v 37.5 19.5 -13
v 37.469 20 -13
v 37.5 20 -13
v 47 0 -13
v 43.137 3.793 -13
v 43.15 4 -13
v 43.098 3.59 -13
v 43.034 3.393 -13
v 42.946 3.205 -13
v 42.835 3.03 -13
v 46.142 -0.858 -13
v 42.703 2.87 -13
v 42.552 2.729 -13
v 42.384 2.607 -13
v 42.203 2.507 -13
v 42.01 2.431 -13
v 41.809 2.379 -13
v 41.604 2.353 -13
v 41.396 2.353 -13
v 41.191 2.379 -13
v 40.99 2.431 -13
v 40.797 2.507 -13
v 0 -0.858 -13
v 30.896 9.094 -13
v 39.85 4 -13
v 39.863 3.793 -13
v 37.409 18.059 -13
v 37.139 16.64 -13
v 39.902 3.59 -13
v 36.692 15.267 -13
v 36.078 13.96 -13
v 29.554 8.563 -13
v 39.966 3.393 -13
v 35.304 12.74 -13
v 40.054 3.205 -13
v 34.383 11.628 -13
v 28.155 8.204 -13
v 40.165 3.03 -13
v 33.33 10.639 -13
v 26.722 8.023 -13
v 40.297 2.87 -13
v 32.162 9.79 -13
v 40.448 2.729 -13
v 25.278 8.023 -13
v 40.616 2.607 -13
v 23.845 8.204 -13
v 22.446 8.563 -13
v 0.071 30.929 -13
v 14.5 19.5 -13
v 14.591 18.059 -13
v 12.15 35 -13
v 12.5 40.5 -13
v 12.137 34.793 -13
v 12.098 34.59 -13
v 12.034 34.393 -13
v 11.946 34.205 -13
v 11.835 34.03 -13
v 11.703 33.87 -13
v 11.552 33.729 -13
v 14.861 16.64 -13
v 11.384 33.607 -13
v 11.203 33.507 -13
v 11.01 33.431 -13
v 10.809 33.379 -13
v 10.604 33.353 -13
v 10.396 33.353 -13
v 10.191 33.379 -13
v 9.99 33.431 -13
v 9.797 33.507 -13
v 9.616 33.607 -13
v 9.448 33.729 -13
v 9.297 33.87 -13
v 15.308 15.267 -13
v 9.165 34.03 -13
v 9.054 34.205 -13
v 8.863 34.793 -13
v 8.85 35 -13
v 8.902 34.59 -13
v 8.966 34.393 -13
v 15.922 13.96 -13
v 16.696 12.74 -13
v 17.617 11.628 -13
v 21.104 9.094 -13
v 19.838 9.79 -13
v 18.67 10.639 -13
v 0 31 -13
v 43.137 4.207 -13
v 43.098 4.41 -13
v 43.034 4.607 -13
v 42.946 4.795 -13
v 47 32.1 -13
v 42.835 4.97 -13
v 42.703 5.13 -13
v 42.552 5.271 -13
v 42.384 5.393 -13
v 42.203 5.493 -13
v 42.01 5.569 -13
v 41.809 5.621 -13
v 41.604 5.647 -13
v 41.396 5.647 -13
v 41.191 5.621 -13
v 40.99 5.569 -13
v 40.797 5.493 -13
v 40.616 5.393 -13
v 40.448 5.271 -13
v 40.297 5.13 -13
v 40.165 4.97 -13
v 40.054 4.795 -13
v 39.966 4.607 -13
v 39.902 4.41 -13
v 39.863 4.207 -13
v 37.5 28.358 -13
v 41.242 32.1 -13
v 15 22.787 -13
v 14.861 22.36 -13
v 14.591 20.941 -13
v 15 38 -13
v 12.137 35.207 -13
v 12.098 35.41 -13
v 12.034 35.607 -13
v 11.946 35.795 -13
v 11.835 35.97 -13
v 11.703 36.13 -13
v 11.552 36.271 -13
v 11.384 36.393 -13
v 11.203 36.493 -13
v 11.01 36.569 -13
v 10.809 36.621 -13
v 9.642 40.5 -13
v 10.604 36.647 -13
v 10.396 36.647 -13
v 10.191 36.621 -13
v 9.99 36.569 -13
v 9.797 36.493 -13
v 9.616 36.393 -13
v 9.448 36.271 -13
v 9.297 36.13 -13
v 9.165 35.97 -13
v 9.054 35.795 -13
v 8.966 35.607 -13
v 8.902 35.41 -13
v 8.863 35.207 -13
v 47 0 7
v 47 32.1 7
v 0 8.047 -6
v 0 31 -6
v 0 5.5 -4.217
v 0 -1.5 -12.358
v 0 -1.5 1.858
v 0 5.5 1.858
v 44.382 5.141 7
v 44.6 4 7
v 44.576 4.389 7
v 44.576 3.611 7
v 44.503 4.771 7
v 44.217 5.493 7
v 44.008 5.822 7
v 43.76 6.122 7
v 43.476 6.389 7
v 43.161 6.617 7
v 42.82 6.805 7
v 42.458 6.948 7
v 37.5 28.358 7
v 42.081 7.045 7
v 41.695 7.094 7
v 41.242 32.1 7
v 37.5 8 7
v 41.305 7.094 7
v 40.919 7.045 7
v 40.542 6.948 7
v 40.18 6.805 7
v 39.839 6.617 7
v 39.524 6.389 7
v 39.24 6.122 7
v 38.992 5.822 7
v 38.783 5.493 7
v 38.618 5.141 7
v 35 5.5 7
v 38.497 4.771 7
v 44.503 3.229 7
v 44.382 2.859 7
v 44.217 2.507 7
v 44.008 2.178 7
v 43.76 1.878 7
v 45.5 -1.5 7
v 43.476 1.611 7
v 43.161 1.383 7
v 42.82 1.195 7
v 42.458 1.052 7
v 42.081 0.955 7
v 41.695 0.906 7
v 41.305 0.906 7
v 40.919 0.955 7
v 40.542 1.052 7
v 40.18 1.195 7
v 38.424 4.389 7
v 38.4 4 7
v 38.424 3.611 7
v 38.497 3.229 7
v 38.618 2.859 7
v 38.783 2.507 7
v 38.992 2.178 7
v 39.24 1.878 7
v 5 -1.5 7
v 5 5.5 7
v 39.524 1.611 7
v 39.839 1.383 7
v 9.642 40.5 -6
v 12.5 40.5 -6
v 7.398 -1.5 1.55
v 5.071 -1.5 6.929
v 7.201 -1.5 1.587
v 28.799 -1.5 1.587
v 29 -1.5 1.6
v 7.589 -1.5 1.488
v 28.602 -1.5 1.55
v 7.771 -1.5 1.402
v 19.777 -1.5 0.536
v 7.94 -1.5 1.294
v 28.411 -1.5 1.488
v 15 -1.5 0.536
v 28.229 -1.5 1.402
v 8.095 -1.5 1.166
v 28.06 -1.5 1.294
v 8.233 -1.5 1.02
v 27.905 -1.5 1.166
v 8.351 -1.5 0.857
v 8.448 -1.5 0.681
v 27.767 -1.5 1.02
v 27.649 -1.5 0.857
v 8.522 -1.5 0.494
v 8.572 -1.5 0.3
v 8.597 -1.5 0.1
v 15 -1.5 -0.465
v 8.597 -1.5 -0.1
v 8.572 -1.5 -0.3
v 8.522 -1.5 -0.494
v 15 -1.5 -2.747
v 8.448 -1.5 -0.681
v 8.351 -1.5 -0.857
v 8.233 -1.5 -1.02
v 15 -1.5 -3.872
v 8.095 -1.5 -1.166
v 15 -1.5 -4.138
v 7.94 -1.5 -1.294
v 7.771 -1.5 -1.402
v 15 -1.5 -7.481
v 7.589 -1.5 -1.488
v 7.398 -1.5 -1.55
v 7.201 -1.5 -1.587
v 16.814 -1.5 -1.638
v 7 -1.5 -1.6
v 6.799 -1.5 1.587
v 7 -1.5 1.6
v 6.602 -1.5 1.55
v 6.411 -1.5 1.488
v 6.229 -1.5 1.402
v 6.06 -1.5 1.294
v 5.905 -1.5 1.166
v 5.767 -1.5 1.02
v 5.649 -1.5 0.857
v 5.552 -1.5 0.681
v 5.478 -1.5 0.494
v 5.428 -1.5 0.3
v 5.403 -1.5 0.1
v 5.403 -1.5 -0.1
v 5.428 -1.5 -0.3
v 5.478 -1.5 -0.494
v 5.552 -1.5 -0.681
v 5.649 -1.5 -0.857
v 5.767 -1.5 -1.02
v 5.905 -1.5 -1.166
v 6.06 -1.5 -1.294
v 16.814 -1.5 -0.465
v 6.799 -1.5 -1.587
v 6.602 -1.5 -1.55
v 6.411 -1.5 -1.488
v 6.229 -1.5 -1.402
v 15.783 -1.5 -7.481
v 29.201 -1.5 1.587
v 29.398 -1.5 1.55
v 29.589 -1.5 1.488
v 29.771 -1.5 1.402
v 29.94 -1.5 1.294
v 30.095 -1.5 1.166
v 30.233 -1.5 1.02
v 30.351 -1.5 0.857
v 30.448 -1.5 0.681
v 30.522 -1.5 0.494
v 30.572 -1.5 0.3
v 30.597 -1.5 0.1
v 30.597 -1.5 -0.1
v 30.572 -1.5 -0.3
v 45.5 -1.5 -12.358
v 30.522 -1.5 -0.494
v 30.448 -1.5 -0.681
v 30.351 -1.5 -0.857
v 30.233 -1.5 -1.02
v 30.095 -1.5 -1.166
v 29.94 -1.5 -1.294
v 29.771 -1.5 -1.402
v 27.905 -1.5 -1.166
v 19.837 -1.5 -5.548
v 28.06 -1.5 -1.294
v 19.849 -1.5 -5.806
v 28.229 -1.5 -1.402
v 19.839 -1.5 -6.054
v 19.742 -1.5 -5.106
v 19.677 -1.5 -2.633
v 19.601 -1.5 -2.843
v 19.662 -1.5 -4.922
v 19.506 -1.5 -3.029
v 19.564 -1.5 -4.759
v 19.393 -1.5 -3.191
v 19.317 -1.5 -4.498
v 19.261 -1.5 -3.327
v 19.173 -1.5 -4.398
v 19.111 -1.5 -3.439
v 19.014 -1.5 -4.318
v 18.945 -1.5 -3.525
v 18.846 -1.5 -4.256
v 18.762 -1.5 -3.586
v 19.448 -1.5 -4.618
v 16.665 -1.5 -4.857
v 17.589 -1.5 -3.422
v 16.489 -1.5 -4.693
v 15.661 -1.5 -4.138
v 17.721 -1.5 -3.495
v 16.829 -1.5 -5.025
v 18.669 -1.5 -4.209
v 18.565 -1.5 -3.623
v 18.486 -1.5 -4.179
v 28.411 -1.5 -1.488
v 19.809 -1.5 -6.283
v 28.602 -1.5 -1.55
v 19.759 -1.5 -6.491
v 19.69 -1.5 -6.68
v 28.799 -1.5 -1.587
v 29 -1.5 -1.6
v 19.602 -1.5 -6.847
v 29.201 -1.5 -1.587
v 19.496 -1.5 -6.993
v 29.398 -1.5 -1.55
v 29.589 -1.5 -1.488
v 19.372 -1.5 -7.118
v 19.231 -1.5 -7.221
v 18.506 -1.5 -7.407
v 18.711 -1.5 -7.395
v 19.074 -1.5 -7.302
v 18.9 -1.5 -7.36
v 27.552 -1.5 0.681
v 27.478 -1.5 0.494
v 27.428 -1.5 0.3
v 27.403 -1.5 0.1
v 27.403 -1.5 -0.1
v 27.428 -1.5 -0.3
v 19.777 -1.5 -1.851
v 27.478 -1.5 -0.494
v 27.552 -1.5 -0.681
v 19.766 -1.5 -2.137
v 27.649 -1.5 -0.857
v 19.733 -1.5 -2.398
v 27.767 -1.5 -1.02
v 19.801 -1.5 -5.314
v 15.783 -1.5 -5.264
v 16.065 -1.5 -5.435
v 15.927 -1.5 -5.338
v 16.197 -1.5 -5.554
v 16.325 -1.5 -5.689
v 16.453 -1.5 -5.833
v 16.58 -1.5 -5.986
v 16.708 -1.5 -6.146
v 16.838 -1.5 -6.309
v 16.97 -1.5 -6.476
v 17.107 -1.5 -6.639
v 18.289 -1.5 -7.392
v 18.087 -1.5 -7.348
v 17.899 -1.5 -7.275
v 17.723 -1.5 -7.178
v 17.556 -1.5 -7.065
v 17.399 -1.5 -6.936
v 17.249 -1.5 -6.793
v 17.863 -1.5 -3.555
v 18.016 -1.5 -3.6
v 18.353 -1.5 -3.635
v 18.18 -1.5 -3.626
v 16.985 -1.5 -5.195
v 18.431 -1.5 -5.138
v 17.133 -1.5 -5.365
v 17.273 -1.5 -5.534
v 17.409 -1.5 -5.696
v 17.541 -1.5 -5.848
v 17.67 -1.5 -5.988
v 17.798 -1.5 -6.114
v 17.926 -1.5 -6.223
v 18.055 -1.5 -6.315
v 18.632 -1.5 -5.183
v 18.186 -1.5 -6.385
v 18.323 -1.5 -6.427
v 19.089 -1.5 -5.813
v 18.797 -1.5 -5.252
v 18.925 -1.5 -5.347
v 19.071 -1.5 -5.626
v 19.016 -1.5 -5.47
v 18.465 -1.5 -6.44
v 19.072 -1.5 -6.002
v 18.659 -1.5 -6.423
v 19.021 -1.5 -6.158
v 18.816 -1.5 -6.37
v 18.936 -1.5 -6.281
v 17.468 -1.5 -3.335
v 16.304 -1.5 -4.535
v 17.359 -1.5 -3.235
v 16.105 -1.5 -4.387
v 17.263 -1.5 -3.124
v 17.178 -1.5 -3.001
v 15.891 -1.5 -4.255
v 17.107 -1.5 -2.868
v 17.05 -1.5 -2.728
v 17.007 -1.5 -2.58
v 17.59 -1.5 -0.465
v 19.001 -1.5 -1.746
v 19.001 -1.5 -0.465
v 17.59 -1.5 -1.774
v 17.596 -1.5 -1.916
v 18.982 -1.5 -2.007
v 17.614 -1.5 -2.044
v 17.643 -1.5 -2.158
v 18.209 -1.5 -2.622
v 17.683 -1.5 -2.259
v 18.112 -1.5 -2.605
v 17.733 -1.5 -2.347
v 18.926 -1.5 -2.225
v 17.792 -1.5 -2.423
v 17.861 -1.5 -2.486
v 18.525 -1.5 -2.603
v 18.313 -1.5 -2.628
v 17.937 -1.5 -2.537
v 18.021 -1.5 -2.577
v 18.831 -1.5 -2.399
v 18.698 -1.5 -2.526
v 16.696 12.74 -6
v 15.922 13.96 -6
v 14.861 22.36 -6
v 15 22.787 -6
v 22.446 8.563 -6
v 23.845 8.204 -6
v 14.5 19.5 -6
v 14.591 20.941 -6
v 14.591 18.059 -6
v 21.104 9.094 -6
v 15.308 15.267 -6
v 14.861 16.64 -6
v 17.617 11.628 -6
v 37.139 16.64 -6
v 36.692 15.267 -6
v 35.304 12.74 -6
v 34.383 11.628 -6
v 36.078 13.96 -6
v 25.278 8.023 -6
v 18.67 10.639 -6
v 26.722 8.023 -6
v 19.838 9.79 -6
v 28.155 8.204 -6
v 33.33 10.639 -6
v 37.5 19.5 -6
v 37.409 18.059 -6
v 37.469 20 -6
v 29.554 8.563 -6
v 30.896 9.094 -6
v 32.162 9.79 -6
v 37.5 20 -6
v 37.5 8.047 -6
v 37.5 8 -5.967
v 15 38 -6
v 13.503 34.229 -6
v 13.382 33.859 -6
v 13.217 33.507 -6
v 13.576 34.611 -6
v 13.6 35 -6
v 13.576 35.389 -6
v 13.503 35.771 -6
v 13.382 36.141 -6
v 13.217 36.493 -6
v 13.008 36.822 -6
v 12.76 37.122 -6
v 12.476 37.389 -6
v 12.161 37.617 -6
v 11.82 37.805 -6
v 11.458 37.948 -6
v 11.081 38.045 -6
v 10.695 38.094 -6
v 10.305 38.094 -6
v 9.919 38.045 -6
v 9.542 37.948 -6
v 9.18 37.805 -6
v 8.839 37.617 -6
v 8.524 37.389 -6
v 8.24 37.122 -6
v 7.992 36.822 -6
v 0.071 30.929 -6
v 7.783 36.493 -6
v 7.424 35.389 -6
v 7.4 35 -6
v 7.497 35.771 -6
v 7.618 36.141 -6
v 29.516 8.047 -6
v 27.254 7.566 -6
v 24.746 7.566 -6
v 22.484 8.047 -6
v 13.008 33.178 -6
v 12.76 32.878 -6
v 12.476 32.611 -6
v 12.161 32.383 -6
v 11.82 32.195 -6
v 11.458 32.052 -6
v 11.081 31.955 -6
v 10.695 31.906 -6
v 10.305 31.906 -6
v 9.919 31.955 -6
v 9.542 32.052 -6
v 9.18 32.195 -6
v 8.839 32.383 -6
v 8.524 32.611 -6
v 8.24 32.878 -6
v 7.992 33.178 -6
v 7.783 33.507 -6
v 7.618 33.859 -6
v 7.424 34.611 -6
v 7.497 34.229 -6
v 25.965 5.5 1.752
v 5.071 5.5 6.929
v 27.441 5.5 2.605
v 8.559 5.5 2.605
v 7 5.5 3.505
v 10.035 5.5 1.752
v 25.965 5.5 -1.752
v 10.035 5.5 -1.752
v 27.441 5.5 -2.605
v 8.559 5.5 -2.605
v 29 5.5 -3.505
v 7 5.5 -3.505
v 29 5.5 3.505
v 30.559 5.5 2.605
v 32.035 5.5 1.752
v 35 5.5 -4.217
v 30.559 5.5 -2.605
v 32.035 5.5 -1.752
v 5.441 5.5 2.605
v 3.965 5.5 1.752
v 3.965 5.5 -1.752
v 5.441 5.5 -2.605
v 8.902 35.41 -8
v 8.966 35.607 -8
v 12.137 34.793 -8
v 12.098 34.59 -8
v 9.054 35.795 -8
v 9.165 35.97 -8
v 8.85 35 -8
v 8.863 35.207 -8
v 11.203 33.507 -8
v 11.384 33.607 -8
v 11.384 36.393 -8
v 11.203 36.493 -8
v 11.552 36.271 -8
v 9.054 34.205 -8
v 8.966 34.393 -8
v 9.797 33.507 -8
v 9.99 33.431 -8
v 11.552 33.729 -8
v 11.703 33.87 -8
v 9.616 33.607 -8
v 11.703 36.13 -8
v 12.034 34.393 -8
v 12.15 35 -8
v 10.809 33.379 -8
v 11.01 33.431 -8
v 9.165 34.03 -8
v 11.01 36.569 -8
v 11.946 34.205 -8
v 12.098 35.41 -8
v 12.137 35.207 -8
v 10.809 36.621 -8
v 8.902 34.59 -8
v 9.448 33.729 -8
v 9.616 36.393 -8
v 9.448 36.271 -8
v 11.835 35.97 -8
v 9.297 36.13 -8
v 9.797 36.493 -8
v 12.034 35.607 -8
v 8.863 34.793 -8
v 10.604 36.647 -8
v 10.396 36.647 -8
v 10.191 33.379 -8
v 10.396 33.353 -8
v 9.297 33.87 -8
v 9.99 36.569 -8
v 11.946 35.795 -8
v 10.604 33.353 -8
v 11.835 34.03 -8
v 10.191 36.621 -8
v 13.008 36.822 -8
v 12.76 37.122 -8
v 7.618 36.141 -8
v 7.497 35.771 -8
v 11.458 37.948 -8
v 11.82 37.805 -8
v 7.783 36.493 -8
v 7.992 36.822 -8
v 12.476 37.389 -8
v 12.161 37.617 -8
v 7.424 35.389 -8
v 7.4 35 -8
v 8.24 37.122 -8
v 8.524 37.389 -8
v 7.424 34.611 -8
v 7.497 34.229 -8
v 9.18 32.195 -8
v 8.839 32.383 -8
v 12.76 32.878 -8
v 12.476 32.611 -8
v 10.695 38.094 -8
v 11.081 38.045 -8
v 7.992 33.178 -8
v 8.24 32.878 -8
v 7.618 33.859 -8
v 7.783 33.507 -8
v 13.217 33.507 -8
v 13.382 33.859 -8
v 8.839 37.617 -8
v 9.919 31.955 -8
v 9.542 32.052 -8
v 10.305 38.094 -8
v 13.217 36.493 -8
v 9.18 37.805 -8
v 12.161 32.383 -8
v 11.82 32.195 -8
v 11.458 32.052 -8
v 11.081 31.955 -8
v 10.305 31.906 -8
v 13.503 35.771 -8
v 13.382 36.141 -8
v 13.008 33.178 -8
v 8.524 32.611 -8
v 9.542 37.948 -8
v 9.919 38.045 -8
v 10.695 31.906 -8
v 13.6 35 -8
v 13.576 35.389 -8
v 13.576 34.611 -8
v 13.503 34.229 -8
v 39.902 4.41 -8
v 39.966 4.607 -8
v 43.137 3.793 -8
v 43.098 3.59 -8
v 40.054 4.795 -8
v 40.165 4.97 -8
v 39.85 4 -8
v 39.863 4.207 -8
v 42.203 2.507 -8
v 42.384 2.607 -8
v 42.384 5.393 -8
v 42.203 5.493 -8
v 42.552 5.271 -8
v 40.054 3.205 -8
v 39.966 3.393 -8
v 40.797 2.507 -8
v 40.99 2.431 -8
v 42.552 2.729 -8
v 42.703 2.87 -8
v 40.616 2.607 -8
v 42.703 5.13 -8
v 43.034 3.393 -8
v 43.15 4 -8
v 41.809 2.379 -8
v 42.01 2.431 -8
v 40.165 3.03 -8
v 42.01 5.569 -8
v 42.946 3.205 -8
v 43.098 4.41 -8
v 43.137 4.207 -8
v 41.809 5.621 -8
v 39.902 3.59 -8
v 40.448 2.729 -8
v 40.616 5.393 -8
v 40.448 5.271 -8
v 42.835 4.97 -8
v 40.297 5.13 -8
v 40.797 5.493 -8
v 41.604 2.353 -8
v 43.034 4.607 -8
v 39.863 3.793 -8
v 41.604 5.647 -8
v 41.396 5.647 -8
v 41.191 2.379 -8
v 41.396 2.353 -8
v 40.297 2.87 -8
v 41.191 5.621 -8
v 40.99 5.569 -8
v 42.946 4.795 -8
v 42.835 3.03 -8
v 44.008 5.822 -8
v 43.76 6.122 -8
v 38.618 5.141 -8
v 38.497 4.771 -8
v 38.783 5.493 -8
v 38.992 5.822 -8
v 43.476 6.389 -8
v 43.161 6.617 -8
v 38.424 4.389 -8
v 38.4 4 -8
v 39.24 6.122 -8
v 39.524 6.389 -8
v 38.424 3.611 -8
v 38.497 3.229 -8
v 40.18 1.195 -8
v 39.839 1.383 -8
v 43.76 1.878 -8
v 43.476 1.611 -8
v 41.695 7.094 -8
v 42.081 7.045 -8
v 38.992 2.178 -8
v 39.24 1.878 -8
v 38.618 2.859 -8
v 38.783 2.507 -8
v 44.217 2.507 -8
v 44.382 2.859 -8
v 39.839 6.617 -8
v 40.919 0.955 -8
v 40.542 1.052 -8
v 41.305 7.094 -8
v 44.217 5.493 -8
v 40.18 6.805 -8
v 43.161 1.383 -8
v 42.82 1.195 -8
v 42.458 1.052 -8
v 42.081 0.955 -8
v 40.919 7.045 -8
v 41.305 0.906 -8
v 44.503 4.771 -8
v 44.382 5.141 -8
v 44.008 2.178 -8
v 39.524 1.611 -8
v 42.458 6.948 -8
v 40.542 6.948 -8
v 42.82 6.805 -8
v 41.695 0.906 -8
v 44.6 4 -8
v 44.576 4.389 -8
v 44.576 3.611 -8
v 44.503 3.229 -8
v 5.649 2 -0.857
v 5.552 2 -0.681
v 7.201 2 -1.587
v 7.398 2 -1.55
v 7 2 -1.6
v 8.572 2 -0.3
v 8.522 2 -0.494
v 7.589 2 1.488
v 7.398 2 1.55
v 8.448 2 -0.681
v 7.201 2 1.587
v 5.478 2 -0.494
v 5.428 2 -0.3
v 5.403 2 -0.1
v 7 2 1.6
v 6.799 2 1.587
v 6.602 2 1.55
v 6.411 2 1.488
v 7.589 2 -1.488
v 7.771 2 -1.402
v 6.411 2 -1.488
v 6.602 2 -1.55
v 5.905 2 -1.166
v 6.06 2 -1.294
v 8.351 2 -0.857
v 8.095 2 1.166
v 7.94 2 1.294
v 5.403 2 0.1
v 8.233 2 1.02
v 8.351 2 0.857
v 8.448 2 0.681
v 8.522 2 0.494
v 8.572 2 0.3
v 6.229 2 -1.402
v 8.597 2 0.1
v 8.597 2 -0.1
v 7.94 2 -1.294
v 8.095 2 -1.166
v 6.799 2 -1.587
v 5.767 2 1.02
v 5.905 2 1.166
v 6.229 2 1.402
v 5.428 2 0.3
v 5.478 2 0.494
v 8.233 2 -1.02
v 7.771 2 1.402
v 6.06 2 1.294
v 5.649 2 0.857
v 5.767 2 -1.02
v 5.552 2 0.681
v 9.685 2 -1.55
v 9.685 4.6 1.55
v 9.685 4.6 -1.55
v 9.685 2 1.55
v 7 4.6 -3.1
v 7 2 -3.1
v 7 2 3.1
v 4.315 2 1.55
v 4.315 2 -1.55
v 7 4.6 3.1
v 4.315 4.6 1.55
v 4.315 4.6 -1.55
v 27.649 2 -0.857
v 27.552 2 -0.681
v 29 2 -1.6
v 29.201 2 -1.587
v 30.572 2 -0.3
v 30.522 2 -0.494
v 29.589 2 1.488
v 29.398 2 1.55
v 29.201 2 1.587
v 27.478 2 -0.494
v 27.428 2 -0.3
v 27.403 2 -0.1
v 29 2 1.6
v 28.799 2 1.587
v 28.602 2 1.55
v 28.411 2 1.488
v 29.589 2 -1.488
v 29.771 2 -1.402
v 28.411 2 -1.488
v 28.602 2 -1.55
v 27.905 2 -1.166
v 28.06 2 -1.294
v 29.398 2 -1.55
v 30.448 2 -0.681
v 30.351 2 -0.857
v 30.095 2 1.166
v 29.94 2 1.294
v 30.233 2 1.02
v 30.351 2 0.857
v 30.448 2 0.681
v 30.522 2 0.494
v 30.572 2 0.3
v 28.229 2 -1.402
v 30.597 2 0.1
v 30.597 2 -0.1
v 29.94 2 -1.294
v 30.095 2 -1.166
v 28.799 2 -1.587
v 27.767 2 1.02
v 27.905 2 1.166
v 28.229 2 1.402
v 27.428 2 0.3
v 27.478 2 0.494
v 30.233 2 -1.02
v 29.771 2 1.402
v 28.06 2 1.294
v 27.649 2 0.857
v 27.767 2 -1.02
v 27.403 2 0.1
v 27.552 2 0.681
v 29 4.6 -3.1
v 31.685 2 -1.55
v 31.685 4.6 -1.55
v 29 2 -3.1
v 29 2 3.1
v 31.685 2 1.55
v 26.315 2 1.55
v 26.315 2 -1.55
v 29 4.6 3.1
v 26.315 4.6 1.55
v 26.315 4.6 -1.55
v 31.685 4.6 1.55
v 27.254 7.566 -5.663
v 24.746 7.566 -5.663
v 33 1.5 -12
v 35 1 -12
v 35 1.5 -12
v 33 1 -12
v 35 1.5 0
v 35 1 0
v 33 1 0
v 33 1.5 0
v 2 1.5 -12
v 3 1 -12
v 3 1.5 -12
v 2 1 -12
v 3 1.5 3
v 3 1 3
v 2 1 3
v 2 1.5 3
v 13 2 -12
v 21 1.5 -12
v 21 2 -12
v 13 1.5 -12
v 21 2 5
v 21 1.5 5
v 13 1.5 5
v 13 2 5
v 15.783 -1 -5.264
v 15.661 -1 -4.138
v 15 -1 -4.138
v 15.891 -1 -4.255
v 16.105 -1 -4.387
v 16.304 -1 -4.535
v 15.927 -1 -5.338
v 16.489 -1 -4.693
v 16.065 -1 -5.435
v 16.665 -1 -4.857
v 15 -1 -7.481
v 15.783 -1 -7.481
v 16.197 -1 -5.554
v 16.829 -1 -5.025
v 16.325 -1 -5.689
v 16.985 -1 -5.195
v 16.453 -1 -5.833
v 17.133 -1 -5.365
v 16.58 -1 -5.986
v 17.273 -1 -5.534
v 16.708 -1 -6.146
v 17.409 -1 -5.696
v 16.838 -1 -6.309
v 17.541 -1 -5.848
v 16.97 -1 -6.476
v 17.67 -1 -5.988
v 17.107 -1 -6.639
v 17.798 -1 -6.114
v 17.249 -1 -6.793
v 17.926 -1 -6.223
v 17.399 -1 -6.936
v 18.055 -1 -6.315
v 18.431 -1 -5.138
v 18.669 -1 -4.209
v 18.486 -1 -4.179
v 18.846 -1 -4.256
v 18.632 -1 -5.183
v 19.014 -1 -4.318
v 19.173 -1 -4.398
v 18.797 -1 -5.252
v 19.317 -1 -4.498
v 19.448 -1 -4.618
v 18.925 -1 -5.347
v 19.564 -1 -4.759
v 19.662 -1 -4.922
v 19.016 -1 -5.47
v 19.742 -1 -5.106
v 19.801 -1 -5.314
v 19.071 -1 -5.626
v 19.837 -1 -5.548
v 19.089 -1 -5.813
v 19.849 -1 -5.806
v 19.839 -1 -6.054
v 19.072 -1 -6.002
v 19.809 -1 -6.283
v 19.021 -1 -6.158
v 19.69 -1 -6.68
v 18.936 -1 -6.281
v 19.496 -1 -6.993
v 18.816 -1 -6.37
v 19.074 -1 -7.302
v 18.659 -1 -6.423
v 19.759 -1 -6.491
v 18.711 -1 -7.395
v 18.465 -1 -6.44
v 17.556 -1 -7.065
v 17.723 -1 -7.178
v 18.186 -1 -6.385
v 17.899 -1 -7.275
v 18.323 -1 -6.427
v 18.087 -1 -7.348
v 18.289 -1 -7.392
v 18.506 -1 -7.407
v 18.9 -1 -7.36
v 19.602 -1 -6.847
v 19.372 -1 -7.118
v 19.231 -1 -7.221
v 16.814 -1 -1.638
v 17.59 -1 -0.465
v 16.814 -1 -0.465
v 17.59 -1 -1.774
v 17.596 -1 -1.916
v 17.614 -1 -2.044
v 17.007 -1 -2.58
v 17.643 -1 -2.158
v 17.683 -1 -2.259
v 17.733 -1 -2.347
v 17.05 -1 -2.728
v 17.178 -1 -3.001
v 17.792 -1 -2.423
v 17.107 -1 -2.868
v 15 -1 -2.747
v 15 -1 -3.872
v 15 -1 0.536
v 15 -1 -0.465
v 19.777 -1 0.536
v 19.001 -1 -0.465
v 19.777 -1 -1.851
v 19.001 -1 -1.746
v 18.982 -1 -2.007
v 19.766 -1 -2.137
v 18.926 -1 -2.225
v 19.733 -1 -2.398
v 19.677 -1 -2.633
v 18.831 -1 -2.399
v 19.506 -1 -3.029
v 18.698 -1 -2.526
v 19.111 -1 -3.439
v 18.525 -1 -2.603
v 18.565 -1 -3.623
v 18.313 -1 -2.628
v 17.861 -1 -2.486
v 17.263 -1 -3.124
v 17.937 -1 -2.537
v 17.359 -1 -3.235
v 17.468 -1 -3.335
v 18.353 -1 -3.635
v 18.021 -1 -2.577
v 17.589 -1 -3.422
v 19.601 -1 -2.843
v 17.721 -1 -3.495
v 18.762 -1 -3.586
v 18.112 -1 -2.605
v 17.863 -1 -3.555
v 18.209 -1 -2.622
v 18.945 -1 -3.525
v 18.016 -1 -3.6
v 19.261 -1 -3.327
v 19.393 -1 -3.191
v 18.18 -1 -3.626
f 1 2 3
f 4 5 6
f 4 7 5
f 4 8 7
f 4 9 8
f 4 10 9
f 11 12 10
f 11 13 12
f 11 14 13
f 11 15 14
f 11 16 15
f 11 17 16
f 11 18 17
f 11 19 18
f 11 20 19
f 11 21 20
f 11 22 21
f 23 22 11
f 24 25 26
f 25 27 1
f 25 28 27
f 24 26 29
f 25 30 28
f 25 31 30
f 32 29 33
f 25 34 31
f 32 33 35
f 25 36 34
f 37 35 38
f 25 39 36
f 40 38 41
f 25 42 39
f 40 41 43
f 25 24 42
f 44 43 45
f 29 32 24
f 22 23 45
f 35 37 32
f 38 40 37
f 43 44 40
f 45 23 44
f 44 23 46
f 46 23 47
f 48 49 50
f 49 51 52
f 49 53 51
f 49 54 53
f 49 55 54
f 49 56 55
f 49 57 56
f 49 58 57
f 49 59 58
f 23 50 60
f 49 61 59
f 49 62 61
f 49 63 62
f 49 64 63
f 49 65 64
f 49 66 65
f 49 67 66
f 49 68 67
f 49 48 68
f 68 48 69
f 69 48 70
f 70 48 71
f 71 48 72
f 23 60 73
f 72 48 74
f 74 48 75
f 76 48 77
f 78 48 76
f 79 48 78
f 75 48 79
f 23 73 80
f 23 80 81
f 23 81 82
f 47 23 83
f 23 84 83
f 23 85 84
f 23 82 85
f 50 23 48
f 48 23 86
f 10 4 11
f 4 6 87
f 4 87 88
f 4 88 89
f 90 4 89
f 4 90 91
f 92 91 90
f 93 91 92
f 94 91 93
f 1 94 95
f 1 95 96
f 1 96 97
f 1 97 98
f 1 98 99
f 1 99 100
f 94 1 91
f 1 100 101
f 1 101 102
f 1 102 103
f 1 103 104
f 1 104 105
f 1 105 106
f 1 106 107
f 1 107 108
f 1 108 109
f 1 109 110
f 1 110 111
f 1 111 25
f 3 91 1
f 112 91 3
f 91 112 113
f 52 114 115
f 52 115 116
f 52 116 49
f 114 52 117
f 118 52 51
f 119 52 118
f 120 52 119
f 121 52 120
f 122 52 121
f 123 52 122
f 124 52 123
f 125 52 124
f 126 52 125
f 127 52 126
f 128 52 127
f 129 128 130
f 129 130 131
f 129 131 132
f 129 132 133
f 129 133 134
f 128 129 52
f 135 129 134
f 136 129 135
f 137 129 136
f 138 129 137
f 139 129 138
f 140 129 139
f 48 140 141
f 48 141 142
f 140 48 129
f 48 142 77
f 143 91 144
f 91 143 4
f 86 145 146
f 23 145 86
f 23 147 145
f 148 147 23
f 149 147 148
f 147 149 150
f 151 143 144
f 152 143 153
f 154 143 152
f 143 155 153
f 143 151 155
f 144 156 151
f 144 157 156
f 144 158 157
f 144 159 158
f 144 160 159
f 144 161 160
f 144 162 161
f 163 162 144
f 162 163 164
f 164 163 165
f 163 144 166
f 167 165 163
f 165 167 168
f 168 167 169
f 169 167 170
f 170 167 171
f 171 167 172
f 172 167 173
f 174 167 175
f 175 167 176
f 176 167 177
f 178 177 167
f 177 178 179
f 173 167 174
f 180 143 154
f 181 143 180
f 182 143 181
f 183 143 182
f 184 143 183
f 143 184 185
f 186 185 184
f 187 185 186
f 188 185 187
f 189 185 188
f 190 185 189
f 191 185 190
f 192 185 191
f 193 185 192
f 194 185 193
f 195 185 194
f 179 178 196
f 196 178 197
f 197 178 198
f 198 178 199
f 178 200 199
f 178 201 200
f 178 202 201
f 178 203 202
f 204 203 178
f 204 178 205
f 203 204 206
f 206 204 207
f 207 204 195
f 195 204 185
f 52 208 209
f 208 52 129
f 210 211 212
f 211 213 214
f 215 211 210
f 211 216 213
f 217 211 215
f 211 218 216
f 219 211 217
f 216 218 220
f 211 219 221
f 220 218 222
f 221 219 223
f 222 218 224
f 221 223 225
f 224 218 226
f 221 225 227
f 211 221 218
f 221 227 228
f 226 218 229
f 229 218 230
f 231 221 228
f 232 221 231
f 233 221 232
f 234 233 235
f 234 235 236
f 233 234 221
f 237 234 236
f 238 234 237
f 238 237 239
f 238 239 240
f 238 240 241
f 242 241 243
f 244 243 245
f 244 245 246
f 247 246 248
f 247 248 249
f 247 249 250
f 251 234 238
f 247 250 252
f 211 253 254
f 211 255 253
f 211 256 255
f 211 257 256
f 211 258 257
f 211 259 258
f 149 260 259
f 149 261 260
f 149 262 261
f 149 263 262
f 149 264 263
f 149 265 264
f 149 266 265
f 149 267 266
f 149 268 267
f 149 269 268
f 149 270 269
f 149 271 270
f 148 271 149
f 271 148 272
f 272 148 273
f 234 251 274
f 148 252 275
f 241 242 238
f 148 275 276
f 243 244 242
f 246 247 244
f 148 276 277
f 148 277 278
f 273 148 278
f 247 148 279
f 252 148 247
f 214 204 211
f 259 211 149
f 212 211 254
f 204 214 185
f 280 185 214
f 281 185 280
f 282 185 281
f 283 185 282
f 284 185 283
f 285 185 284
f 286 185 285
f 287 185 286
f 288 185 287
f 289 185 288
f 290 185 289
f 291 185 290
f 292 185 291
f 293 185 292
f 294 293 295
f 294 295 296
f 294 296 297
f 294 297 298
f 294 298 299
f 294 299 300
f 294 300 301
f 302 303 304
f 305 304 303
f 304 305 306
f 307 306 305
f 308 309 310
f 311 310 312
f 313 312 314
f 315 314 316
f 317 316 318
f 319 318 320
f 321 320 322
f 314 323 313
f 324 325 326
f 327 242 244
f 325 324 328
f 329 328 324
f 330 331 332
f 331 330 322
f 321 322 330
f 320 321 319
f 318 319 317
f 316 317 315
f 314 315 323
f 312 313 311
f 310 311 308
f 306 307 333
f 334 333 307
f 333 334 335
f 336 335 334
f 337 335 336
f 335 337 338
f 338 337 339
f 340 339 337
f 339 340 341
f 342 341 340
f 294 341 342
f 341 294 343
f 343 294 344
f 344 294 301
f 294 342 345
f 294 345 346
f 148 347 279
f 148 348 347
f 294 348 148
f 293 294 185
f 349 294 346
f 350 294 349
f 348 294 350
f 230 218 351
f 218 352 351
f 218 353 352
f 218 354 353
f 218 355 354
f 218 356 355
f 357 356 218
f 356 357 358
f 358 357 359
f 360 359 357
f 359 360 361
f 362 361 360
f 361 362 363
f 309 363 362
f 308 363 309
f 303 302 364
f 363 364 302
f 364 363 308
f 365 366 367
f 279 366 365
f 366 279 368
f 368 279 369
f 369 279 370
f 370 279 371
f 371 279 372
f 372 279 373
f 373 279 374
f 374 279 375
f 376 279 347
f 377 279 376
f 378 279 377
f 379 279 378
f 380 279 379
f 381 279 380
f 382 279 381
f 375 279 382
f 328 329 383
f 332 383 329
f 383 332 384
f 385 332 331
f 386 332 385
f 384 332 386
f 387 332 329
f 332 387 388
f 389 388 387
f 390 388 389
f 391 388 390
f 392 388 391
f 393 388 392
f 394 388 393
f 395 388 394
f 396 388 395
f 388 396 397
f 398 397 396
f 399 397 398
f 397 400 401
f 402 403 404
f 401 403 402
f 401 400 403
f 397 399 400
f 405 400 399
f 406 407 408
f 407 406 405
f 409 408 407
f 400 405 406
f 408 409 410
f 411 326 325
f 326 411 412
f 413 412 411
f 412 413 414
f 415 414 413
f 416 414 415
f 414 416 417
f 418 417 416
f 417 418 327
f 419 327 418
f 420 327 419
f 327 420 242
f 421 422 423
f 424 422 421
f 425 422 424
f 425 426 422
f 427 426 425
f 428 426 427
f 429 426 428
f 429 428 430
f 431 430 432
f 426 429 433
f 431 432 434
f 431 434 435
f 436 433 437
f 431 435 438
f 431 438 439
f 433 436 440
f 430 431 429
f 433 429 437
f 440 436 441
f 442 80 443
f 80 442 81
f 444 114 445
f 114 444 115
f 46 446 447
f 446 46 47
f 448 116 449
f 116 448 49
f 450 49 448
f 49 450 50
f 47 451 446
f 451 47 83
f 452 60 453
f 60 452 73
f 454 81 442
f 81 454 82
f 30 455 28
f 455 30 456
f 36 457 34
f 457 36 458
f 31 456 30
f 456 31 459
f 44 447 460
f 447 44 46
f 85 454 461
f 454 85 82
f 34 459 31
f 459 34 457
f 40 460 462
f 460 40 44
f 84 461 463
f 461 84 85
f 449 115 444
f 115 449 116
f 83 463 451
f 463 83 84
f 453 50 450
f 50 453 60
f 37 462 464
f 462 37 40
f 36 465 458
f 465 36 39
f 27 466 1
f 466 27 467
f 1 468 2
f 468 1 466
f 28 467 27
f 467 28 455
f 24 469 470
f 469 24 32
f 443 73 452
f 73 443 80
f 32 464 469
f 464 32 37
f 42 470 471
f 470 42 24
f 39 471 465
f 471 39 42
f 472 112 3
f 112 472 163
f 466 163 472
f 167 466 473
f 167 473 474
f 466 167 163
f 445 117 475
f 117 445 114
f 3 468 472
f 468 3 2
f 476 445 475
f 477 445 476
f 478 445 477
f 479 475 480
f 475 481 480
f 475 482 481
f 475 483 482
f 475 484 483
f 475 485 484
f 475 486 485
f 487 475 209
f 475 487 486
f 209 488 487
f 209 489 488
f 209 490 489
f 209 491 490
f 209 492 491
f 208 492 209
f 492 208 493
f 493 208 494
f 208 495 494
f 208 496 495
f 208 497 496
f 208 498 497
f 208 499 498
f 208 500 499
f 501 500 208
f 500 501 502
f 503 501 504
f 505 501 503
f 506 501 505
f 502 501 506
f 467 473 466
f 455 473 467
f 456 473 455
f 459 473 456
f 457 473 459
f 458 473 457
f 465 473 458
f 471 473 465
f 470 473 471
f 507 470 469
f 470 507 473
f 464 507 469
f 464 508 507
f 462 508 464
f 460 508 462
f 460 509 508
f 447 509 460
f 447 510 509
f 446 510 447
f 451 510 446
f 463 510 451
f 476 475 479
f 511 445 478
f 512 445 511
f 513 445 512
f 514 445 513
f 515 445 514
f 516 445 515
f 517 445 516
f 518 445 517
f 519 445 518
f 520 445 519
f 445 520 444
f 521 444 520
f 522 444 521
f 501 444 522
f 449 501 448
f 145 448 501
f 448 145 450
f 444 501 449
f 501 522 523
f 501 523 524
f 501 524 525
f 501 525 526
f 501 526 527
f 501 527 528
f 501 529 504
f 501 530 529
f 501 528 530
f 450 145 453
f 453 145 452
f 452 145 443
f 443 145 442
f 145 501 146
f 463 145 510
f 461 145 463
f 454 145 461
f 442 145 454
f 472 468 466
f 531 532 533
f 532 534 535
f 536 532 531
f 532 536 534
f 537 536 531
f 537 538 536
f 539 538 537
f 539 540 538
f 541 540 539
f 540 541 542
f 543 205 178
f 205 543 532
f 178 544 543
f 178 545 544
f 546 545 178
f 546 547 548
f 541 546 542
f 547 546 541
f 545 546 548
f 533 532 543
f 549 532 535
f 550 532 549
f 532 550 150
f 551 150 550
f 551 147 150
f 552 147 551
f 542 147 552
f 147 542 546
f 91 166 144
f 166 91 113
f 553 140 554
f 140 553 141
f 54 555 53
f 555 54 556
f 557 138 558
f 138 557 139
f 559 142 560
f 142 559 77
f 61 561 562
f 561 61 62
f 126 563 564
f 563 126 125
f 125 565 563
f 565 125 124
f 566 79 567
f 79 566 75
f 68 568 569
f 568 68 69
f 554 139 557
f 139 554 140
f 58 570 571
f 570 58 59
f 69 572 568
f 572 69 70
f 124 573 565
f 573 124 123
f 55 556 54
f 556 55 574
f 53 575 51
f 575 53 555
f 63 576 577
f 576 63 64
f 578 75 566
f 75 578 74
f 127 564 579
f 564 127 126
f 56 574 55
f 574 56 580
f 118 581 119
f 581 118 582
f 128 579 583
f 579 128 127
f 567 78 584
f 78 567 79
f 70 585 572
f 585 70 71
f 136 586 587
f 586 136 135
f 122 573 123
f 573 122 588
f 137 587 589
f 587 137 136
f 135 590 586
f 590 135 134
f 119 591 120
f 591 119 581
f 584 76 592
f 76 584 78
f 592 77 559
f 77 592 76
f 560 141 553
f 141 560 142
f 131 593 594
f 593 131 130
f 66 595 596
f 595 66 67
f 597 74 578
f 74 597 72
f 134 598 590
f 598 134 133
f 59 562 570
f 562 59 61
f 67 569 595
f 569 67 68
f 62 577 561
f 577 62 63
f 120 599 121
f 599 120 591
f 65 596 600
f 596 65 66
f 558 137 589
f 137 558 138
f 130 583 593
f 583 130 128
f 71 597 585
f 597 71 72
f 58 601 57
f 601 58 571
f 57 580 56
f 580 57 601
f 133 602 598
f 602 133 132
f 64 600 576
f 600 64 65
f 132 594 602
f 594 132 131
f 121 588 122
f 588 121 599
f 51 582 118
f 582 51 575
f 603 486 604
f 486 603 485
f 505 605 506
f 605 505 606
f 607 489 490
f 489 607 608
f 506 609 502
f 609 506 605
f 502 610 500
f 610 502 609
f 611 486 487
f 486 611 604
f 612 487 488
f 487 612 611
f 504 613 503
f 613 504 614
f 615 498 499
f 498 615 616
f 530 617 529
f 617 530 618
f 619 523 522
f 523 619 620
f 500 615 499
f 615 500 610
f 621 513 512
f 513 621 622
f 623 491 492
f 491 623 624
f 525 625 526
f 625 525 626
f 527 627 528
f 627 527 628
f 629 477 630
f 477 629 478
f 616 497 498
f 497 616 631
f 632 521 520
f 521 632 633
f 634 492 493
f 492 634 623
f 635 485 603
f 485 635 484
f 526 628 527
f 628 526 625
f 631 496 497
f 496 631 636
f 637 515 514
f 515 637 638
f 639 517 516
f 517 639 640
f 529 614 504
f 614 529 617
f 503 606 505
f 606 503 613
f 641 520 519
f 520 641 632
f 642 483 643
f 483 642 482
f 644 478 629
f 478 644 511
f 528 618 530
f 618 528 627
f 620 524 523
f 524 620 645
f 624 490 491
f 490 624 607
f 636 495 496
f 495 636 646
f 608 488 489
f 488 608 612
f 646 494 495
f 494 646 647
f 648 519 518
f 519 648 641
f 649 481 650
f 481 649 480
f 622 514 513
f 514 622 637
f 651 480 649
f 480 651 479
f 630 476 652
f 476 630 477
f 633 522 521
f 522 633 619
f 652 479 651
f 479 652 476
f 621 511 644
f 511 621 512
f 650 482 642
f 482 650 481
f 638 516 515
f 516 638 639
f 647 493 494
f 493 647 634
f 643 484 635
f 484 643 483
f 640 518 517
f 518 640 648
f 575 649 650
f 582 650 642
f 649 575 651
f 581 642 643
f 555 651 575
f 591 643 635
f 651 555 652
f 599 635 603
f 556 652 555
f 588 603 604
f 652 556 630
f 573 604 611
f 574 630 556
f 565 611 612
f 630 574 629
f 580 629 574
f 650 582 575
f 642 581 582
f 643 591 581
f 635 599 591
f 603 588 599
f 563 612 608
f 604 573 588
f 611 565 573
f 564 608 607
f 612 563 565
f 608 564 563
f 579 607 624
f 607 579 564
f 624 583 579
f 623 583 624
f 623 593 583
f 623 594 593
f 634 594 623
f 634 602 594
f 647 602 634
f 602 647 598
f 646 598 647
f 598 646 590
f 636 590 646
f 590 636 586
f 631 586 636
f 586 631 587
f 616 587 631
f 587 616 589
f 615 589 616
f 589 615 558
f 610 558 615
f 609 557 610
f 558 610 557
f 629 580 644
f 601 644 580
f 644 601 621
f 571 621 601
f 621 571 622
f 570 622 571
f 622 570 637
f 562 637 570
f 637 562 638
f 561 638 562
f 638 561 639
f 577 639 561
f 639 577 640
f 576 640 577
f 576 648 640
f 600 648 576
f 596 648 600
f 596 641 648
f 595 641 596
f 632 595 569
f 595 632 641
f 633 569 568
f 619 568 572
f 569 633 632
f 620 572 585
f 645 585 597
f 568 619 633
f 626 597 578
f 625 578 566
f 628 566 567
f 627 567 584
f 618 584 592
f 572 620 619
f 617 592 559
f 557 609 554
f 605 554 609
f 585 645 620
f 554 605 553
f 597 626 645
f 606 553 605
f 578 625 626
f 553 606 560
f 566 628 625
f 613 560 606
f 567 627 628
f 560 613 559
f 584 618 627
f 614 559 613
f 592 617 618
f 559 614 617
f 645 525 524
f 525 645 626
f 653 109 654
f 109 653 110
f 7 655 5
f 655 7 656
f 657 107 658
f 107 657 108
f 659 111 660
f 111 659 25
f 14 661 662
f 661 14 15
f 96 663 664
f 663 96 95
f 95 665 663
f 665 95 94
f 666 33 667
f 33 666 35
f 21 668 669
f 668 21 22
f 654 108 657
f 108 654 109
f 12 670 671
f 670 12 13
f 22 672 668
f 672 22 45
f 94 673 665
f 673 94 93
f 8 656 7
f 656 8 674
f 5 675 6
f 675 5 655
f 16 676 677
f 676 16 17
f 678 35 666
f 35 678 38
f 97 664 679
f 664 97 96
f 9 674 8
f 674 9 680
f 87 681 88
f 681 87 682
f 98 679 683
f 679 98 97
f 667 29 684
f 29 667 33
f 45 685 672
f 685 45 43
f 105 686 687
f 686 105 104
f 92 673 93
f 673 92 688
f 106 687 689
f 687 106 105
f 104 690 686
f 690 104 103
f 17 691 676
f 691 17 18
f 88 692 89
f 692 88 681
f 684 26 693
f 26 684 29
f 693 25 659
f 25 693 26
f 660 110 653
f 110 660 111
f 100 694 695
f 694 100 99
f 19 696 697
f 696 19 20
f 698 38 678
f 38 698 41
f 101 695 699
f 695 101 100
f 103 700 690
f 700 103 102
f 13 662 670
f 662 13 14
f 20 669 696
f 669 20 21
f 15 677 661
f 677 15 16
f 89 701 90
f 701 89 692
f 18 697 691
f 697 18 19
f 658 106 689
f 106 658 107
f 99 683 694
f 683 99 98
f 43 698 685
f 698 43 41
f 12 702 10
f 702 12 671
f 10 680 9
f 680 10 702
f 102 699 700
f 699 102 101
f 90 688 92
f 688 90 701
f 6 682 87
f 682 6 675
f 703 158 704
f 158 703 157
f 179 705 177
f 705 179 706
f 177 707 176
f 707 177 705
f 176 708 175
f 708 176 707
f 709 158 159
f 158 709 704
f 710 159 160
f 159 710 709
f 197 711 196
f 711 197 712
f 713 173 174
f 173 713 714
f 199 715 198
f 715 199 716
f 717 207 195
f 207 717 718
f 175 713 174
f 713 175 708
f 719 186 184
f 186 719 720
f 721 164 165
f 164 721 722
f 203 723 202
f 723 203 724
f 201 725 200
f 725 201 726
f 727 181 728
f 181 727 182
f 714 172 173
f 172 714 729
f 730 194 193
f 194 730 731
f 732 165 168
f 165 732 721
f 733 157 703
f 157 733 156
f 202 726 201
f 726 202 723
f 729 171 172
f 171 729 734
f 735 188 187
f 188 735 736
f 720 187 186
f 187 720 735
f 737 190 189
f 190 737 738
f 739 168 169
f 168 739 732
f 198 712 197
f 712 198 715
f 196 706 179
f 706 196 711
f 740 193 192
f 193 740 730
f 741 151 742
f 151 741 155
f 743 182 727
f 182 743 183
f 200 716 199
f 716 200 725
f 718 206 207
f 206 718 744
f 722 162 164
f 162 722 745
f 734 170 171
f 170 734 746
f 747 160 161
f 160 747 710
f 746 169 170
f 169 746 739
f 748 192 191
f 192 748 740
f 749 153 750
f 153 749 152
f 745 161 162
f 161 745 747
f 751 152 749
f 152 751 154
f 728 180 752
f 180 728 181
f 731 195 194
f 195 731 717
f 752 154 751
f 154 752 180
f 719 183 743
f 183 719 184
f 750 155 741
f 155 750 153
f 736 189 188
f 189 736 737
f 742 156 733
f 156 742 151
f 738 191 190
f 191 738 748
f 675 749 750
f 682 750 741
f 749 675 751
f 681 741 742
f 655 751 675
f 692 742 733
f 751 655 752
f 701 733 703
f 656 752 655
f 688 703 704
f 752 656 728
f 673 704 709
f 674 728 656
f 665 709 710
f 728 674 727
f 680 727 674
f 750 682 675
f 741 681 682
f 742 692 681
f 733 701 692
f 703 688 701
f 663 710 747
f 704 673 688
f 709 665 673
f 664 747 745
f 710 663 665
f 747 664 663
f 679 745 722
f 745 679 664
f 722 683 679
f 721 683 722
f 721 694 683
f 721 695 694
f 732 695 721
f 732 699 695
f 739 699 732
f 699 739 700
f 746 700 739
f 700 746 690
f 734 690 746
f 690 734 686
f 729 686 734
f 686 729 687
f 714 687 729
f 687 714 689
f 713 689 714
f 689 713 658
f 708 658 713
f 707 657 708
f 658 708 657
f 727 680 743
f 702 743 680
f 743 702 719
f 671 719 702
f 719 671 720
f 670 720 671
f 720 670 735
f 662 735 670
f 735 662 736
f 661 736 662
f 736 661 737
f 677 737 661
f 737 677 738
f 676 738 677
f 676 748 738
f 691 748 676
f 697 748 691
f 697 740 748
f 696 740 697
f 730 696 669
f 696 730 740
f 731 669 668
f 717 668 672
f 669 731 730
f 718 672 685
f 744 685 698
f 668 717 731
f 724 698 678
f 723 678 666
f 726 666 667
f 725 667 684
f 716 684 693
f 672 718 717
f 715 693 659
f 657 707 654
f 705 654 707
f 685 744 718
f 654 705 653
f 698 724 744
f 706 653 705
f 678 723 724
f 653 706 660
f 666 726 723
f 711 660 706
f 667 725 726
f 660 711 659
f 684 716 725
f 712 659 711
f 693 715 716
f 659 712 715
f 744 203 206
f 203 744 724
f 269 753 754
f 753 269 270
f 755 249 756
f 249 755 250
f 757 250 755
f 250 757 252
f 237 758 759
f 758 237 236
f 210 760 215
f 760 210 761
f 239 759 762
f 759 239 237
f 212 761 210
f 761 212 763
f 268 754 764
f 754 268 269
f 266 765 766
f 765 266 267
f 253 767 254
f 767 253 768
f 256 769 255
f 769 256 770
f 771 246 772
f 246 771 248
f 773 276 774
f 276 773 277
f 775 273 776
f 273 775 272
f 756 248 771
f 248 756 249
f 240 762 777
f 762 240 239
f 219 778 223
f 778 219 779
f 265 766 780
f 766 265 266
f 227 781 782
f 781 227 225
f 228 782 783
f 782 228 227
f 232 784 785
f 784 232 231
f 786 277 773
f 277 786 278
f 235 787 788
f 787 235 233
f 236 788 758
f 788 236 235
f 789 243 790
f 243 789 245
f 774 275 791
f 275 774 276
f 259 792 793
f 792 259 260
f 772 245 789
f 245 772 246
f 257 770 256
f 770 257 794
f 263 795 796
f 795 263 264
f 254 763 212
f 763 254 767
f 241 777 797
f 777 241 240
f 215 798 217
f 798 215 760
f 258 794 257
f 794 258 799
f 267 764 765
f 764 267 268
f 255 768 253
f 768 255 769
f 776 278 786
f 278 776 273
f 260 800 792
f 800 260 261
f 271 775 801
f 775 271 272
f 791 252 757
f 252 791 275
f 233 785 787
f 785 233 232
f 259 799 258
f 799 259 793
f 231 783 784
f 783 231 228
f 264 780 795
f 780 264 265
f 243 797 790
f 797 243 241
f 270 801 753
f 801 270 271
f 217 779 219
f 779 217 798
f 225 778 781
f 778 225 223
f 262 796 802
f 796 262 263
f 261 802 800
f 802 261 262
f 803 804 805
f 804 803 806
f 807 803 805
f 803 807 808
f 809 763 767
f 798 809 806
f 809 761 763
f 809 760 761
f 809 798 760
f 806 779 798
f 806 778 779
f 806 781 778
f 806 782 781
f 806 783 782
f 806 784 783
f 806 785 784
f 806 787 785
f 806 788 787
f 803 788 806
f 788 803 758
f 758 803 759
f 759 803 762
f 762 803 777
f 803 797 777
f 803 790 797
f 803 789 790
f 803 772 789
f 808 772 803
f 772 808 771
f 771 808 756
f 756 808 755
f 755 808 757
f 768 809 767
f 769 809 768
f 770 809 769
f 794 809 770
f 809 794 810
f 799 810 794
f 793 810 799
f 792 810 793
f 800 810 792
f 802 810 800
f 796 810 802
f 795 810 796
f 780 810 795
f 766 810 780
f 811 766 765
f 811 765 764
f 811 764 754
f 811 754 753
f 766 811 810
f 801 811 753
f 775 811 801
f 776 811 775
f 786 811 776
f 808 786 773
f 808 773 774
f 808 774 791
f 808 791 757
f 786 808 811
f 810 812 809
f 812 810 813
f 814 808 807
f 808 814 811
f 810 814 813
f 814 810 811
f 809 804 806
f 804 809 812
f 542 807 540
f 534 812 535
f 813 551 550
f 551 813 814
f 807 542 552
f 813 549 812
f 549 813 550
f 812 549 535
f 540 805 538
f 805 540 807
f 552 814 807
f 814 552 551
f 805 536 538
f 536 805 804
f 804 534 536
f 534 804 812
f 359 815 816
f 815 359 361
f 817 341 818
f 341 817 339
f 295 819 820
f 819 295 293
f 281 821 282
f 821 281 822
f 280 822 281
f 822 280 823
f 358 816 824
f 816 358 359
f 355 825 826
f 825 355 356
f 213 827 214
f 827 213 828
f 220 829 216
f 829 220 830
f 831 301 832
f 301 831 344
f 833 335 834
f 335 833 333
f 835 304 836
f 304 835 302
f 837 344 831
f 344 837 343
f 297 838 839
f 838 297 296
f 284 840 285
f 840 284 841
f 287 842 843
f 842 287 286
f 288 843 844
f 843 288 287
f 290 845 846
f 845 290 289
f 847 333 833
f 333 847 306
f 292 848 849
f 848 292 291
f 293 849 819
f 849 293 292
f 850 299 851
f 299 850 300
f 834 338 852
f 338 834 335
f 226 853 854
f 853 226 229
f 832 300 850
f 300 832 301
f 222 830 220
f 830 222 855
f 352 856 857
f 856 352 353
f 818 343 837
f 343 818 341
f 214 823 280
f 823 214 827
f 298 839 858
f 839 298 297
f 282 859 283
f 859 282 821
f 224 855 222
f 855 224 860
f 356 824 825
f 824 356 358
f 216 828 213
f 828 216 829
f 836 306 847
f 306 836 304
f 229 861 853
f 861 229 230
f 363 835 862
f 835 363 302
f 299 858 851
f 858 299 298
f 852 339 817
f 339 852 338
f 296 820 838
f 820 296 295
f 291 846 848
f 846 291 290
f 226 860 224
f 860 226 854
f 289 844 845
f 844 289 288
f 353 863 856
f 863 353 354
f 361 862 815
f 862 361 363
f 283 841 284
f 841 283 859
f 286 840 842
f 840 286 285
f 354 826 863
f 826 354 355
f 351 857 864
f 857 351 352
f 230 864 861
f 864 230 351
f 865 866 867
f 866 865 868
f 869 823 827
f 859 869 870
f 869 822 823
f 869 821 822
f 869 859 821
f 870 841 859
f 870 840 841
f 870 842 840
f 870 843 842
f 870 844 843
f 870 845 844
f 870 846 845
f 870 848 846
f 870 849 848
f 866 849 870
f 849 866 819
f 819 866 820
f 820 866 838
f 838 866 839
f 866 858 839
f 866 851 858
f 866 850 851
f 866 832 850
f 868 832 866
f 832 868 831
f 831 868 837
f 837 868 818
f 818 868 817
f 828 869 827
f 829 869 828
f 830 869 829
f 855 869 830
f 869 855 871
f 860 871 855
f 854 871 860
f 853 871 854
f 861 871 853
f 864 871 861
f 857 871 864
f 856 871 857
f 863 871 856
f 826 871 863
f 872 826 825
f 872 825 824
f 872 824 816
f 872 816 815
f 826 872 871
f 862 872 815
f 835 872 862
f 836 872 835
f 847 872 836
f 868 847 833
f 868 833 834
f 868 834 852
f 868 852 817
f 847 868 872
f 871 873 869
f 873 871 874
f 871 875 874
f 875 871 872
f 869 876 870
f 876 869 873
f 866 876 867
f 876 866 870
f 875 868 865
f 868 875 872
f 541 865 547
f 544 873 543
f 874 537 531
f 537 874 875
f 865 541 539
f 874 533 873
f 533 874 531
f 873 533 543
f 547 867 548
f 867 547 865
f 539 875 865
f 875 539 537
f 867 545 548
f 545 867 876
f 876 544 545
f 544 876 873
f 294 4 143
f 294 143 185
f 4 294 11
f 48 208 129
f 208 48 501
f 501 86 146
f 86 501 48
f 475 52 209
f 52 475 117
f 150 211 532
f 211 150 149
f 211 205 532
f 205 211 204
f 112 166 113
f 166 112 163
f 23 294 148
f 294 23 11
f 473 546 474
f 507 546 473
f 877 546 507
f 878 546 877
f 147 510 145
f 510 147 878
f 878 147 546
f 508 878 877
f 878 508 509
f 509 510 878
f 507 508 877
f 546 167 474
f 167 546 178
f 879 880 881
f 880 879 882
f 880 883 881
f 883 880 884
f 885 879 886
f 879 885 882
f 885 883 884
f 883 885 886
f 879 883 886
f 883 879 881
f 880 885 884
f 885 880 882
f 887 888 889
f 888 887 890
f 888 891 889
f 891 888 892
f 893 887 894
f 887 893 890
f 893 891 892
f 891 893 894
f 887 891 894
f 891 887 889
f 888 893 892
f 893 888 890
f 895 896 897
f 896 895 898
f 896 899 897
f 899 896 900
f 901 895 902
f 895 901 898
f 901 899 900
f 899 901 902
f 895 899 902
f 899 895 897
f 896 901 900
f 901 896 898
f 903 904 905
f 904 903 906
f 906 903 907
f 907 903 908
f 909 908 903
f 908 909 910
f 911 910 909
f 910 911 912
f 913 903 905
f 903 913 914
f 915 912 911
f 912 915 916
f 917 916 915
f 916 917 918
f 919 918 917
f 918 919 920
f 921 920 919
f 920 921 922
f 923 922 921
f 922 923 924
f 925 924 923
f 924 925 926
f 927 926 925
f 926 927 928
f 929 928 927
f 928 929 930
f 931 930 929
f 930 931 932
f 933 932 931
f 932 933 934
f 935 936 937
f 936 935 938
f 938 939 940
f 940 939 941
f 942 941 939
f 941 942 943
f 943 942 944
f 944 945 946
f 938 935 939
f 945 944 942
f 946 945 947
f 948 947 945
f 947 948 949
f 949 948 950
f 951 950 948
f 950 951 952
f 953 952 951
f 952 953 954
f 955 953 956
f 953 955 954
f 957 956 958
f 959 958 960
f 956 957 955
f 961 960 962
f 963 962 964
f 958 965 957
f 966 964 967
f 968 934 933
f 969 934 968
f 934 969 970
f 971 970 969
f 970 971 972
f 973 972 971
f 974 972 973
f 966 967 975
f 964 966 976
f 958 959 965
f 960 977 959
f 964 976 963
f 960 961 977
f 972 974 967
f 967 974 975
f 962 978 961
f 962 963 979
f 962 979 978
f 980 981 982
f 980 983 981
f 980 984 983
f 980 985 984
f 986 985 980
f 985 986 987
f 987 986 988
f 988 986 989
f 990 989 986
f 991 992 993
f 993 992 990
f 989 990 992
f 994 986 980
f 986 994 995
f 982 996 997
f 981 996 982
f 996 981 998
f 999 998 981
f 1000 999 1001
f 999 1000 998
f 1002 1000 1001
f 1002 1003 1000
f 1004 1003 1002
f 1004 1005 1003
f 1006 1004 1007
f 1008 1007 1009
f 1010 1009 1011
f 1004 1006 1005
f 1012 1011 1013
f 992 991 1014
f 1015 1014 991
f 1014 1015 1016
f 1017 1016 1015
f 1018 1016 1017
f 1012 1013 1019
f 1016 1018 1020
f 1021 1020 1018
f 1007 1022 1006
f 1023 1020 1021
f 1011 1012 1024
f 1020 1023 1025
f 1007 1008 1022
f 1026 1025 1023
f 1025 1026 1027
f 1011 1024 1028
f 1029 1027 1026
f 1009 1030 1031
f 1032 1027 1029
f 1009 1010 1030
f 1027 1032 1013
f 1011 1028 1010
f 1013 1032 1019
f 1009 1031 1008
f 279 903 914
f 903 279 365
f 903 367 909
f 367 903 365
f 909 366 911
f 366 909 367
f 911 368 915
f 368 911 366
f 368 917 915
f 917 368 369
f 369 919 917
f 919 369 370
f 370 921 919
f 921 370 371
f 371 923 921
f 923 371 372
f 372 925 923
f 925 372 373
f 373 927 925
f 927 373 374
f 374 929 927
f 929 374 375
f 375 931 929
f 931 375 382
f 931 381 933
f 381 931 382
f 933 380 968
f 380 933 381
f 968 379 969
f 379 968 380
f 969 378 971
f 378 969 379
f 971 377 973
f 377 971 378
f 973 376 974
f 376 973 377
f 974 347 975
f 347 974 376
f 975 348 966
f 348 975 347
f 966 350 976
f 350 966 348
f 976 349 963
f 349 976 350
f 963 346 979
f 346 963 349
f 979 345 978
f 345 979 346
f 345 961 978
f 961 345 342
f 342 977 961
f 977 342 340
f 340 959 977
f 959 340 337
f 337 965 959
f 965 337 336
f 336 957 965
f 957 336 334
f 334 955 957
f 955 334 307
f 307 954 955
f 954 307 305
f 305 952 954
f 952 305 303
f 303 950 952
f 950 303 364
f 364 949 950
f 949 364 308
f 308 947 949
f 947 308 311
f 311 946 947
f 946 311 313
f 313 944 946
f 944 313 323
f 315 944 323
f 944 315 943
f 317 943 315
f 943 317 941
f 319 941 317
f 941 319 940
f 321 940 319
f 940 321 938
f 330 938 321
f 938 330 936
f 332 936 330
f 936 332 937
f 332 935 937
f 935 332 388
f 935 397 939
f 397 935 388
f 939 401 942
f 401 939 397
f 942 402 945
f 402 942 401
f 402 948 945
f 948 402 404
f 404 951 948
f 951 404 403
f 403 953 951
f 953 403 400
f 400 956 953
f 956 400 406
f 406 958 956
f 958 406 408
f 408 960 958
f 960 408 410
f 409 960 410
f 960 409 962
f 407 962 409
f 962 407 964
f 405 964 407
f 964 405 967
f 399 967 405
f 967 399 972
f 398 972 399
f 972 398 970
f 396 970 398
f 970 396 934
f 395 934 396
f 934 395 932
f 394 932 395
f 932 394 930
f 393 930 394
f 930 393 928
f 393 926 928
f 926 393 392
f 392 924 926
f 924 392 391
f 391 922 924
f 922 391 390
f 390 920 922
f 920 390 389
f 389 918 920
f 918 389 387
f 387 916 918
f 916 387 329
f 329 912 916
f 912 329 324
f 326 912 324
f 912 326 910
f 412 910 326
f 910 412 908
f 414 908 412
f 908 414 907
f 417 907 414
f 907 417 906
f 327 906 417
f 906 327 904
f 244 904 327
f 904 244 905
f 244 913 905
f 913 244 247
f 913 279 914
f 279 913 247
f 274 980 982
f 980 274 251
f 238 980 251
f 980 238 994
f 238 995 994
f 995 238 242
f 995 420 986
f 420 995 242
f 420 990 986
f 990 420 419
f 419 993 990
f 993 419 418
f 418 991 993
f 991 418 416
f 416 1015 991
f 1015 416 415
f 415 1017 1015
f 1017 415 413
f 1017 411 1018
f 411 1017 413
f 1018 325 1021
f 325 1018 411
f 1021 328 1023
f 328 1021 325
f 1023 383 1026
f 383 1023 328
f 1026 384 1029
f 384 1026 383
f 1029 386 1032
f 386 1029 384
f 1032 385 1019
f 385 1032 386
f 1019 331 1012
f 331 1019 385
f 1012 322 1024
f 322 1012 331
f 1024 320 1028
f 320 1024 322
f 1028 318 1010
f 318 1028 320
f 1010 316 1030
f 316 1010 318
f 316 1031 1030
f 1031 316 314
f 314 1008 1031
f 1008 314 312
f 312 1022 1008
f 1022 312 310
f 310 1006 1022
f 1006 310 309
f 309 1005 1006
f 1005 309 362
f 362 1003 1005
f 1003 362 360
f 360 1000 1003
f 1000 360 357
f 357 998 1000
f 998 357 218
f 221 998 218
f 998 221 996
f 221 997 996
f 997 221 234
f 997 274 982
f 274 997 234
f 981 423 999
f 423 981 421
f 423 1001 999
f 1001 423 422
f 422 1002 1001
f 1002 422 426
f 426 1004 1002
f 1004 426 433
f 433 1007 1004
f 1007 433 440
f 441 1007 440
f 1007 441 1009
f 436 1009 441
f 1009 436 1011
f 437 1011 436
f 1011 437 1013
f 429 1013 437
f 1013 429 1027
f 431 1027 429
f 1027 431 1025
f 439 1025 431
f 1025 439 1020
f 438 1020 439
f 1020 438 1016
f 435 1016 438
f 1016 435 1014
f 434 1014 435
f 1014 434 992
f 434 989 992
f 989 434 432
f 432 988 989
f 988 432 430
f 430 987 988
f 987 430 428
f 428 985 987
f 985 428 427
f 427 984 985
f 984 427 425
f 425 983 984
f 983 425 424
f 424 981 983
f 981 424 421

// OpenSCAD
    
// Y motor holder
// GNU GPL v3
// Josef Průša <iam@josefprusa.cz> and contributors
// http://www.reprap.org/wiki/Prusa_Mendel
// http://prusamendel.org

module holder()
{
    difference()
    {
        // base body
        translate([-7,-1.5,0]) cube([20,42,47]);

        // shape cuts
        translate([-20,19.5,26]) rotate([0,90,0]) cylinder( h=35, r=11.5, $fn=50 );   
        translate([-11,20,15]) cube([26,23,22.5]);
        translate([-20,5.5,-1]) cube([26,41,38.5]);
        translate([-20,32.1,37]) cube([34,30,20]);
        
        // lower motor screw
        translate([-20,35 ,10.5]) rotate([0,90,0]) cylinder( h=40, r=1.65, $fn=50 ); 
        translate([-7,35,10.5]) rotate([0,90,0]) cylinder( h=15, r=3.1, $fn=50 );         
        
        // upper motor screw    
        translate([-20,4,41.5]) rotate([0,90,0]) cylinder( h=40, r=1.65, $fn=50 );         
        translate([-8,4,41.5]) rotate([0,90,0]) cylinder( h=16, r=3.1, $fn=50 );         
        
        // lower frame screw    
        translate([0,12,7]) rotate([90,0,0]) cylinder( h=40, r=1.6, $fn=50 ); 
        translate([0,7,7]) rotate([90,0,0]) cylinder( h=5, r=3.1, $fn=6 ); 
        translate([0,6.6,7]) rotate([90,0,0]) cylinder( h=2, r2=3.1, r1=4, $fn=6 ); 
        
        // upper frame screw    
        translate([0,12,29]) rotate([90,0,0]) cylinder( h=40, r=1.6, $fn=50 ); 
        translate([0,7,29]) rotate([90,0,0]) cylinder( h=5, r=3.1, $fn=6 ); 
        translate([0,6.6,29]) rotate([90,0,0]) cylinder( h=2, r2=3.1, r1=4, $fn=6 );

        // corners
        translate([-10,-5,42]) rotate([45,0,0]) cube([60,10,10]);        
        translate([-10,38,-7]) rotate([45,0,0]) cube([60,20,10]);        
        translate([-10,43,10]) rotate([45,0,0]) cube([60,20,20]);  
        translate([-14,-10,-2]) rotate([0,45,0]) cube([10,50,10]);        
        translate([-14,33,28]) rotate([45,0,0]) cube([28,10,10]);        
        translate([18,-10,-5]) rotate([0,0,45]) cube([10,10,60]);        
    }
    
    // reinforcement
    translate([7.8,1.9,0]) rotate([0,0,55]) cube([5,5,18]);
    translate([-7,4.5,34]) rotate([45,0,0]) cube([18,6,2.5]);
    difference()
        {
            translate([7.8,1.9,13.6]) rotate([0,0,55]) cube([5,5,24]);
            translate([-20,19.5,26]) rotate([0,90,0]) cylinder( h=35, r=12, $fn=30 );   
        }
   
}
 
module y_motor_holder()
{
    rotate([0,90,0])
    difference()
        {
        holder();
       
        // selective infill
        translate([-0,1,33]) cube([12,0.5,2]);        
        translate([-3,1,2]) cube([15,0.5,1]);        
        translate([-5,1.5,13]) cube([17,0.5,8]);        
        
        //version
        translate([-1,-1,15]) rotate([90,0,0]) linear_extrude(height = 0.6) 
        { text("R2",font = "helvetica:style=Bold", size=5, center=true); }
        }
}    
    
y_motor_holder();    
    
    
    
